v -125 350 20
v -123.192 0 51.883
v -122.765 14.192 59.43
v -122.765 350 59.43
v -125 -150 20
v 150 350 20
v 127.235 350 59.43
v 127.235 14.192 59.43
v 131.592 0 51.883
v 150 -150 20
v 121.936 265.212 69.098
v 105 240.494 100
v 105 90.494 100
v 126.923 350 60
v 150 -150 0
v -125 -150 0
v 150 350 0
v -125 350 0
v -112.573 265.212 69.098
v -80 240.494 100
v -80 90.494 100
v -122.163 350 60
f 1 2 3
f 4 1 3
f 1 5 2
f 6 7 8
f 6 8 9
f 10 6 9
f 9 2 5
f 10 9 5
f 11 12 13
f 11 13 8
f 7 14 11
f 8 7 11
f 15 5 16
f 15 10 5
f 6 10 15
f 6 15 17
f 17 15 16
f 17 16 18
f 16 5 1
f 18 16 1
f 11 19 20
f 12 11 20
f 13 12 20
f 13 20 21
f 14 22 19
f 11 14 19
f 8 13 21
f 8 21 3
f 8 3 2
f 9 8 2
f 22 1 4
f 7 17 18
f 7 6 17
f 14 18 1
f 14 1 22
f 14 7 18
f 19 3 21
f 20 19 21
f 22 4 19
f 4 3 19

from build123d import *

# Parameters (mm, degrees)
F1_DEPTH      = 150
F1_DEPTH_BACK = 125
F3_DEPTH      = 2000


with BuildPart() as f1:
    # F0 (on Right) → F1 (new body, two sides)
    with BuildSketch(Plane.YZ) as f1_sk:
        Polygon((-150, 20), (-150, 0), (350, 0), (350, 60), (265.2117013931, 69.0981149673), (240.4940045903, 100), (90.4940045903, 100), (0, 51.8834842505), align=None)
    extrude(amount=F1_DEPTH)
    extrude(f1_sk.sketch, amount=-F1_DEPTH_BACK)

    # F2 (on face) → F3 (intersect)
    with BuildSketch(Plane(origin=(0, 350, 0), x_dir=(-1, 0, 0), z_dir=(0, 1, 0))):
        Polygon((122.7646524241, 59.4295346152), (80, 100), (-105, 100), (-127.2353475759, 59.4295346152), (-150, 20), (-150, 0), (125, 0), (125, 20), align=None)
    extrude(amount=-F3_DEPTH, mode=Mode.INTERSECT)


solid = f1.part
